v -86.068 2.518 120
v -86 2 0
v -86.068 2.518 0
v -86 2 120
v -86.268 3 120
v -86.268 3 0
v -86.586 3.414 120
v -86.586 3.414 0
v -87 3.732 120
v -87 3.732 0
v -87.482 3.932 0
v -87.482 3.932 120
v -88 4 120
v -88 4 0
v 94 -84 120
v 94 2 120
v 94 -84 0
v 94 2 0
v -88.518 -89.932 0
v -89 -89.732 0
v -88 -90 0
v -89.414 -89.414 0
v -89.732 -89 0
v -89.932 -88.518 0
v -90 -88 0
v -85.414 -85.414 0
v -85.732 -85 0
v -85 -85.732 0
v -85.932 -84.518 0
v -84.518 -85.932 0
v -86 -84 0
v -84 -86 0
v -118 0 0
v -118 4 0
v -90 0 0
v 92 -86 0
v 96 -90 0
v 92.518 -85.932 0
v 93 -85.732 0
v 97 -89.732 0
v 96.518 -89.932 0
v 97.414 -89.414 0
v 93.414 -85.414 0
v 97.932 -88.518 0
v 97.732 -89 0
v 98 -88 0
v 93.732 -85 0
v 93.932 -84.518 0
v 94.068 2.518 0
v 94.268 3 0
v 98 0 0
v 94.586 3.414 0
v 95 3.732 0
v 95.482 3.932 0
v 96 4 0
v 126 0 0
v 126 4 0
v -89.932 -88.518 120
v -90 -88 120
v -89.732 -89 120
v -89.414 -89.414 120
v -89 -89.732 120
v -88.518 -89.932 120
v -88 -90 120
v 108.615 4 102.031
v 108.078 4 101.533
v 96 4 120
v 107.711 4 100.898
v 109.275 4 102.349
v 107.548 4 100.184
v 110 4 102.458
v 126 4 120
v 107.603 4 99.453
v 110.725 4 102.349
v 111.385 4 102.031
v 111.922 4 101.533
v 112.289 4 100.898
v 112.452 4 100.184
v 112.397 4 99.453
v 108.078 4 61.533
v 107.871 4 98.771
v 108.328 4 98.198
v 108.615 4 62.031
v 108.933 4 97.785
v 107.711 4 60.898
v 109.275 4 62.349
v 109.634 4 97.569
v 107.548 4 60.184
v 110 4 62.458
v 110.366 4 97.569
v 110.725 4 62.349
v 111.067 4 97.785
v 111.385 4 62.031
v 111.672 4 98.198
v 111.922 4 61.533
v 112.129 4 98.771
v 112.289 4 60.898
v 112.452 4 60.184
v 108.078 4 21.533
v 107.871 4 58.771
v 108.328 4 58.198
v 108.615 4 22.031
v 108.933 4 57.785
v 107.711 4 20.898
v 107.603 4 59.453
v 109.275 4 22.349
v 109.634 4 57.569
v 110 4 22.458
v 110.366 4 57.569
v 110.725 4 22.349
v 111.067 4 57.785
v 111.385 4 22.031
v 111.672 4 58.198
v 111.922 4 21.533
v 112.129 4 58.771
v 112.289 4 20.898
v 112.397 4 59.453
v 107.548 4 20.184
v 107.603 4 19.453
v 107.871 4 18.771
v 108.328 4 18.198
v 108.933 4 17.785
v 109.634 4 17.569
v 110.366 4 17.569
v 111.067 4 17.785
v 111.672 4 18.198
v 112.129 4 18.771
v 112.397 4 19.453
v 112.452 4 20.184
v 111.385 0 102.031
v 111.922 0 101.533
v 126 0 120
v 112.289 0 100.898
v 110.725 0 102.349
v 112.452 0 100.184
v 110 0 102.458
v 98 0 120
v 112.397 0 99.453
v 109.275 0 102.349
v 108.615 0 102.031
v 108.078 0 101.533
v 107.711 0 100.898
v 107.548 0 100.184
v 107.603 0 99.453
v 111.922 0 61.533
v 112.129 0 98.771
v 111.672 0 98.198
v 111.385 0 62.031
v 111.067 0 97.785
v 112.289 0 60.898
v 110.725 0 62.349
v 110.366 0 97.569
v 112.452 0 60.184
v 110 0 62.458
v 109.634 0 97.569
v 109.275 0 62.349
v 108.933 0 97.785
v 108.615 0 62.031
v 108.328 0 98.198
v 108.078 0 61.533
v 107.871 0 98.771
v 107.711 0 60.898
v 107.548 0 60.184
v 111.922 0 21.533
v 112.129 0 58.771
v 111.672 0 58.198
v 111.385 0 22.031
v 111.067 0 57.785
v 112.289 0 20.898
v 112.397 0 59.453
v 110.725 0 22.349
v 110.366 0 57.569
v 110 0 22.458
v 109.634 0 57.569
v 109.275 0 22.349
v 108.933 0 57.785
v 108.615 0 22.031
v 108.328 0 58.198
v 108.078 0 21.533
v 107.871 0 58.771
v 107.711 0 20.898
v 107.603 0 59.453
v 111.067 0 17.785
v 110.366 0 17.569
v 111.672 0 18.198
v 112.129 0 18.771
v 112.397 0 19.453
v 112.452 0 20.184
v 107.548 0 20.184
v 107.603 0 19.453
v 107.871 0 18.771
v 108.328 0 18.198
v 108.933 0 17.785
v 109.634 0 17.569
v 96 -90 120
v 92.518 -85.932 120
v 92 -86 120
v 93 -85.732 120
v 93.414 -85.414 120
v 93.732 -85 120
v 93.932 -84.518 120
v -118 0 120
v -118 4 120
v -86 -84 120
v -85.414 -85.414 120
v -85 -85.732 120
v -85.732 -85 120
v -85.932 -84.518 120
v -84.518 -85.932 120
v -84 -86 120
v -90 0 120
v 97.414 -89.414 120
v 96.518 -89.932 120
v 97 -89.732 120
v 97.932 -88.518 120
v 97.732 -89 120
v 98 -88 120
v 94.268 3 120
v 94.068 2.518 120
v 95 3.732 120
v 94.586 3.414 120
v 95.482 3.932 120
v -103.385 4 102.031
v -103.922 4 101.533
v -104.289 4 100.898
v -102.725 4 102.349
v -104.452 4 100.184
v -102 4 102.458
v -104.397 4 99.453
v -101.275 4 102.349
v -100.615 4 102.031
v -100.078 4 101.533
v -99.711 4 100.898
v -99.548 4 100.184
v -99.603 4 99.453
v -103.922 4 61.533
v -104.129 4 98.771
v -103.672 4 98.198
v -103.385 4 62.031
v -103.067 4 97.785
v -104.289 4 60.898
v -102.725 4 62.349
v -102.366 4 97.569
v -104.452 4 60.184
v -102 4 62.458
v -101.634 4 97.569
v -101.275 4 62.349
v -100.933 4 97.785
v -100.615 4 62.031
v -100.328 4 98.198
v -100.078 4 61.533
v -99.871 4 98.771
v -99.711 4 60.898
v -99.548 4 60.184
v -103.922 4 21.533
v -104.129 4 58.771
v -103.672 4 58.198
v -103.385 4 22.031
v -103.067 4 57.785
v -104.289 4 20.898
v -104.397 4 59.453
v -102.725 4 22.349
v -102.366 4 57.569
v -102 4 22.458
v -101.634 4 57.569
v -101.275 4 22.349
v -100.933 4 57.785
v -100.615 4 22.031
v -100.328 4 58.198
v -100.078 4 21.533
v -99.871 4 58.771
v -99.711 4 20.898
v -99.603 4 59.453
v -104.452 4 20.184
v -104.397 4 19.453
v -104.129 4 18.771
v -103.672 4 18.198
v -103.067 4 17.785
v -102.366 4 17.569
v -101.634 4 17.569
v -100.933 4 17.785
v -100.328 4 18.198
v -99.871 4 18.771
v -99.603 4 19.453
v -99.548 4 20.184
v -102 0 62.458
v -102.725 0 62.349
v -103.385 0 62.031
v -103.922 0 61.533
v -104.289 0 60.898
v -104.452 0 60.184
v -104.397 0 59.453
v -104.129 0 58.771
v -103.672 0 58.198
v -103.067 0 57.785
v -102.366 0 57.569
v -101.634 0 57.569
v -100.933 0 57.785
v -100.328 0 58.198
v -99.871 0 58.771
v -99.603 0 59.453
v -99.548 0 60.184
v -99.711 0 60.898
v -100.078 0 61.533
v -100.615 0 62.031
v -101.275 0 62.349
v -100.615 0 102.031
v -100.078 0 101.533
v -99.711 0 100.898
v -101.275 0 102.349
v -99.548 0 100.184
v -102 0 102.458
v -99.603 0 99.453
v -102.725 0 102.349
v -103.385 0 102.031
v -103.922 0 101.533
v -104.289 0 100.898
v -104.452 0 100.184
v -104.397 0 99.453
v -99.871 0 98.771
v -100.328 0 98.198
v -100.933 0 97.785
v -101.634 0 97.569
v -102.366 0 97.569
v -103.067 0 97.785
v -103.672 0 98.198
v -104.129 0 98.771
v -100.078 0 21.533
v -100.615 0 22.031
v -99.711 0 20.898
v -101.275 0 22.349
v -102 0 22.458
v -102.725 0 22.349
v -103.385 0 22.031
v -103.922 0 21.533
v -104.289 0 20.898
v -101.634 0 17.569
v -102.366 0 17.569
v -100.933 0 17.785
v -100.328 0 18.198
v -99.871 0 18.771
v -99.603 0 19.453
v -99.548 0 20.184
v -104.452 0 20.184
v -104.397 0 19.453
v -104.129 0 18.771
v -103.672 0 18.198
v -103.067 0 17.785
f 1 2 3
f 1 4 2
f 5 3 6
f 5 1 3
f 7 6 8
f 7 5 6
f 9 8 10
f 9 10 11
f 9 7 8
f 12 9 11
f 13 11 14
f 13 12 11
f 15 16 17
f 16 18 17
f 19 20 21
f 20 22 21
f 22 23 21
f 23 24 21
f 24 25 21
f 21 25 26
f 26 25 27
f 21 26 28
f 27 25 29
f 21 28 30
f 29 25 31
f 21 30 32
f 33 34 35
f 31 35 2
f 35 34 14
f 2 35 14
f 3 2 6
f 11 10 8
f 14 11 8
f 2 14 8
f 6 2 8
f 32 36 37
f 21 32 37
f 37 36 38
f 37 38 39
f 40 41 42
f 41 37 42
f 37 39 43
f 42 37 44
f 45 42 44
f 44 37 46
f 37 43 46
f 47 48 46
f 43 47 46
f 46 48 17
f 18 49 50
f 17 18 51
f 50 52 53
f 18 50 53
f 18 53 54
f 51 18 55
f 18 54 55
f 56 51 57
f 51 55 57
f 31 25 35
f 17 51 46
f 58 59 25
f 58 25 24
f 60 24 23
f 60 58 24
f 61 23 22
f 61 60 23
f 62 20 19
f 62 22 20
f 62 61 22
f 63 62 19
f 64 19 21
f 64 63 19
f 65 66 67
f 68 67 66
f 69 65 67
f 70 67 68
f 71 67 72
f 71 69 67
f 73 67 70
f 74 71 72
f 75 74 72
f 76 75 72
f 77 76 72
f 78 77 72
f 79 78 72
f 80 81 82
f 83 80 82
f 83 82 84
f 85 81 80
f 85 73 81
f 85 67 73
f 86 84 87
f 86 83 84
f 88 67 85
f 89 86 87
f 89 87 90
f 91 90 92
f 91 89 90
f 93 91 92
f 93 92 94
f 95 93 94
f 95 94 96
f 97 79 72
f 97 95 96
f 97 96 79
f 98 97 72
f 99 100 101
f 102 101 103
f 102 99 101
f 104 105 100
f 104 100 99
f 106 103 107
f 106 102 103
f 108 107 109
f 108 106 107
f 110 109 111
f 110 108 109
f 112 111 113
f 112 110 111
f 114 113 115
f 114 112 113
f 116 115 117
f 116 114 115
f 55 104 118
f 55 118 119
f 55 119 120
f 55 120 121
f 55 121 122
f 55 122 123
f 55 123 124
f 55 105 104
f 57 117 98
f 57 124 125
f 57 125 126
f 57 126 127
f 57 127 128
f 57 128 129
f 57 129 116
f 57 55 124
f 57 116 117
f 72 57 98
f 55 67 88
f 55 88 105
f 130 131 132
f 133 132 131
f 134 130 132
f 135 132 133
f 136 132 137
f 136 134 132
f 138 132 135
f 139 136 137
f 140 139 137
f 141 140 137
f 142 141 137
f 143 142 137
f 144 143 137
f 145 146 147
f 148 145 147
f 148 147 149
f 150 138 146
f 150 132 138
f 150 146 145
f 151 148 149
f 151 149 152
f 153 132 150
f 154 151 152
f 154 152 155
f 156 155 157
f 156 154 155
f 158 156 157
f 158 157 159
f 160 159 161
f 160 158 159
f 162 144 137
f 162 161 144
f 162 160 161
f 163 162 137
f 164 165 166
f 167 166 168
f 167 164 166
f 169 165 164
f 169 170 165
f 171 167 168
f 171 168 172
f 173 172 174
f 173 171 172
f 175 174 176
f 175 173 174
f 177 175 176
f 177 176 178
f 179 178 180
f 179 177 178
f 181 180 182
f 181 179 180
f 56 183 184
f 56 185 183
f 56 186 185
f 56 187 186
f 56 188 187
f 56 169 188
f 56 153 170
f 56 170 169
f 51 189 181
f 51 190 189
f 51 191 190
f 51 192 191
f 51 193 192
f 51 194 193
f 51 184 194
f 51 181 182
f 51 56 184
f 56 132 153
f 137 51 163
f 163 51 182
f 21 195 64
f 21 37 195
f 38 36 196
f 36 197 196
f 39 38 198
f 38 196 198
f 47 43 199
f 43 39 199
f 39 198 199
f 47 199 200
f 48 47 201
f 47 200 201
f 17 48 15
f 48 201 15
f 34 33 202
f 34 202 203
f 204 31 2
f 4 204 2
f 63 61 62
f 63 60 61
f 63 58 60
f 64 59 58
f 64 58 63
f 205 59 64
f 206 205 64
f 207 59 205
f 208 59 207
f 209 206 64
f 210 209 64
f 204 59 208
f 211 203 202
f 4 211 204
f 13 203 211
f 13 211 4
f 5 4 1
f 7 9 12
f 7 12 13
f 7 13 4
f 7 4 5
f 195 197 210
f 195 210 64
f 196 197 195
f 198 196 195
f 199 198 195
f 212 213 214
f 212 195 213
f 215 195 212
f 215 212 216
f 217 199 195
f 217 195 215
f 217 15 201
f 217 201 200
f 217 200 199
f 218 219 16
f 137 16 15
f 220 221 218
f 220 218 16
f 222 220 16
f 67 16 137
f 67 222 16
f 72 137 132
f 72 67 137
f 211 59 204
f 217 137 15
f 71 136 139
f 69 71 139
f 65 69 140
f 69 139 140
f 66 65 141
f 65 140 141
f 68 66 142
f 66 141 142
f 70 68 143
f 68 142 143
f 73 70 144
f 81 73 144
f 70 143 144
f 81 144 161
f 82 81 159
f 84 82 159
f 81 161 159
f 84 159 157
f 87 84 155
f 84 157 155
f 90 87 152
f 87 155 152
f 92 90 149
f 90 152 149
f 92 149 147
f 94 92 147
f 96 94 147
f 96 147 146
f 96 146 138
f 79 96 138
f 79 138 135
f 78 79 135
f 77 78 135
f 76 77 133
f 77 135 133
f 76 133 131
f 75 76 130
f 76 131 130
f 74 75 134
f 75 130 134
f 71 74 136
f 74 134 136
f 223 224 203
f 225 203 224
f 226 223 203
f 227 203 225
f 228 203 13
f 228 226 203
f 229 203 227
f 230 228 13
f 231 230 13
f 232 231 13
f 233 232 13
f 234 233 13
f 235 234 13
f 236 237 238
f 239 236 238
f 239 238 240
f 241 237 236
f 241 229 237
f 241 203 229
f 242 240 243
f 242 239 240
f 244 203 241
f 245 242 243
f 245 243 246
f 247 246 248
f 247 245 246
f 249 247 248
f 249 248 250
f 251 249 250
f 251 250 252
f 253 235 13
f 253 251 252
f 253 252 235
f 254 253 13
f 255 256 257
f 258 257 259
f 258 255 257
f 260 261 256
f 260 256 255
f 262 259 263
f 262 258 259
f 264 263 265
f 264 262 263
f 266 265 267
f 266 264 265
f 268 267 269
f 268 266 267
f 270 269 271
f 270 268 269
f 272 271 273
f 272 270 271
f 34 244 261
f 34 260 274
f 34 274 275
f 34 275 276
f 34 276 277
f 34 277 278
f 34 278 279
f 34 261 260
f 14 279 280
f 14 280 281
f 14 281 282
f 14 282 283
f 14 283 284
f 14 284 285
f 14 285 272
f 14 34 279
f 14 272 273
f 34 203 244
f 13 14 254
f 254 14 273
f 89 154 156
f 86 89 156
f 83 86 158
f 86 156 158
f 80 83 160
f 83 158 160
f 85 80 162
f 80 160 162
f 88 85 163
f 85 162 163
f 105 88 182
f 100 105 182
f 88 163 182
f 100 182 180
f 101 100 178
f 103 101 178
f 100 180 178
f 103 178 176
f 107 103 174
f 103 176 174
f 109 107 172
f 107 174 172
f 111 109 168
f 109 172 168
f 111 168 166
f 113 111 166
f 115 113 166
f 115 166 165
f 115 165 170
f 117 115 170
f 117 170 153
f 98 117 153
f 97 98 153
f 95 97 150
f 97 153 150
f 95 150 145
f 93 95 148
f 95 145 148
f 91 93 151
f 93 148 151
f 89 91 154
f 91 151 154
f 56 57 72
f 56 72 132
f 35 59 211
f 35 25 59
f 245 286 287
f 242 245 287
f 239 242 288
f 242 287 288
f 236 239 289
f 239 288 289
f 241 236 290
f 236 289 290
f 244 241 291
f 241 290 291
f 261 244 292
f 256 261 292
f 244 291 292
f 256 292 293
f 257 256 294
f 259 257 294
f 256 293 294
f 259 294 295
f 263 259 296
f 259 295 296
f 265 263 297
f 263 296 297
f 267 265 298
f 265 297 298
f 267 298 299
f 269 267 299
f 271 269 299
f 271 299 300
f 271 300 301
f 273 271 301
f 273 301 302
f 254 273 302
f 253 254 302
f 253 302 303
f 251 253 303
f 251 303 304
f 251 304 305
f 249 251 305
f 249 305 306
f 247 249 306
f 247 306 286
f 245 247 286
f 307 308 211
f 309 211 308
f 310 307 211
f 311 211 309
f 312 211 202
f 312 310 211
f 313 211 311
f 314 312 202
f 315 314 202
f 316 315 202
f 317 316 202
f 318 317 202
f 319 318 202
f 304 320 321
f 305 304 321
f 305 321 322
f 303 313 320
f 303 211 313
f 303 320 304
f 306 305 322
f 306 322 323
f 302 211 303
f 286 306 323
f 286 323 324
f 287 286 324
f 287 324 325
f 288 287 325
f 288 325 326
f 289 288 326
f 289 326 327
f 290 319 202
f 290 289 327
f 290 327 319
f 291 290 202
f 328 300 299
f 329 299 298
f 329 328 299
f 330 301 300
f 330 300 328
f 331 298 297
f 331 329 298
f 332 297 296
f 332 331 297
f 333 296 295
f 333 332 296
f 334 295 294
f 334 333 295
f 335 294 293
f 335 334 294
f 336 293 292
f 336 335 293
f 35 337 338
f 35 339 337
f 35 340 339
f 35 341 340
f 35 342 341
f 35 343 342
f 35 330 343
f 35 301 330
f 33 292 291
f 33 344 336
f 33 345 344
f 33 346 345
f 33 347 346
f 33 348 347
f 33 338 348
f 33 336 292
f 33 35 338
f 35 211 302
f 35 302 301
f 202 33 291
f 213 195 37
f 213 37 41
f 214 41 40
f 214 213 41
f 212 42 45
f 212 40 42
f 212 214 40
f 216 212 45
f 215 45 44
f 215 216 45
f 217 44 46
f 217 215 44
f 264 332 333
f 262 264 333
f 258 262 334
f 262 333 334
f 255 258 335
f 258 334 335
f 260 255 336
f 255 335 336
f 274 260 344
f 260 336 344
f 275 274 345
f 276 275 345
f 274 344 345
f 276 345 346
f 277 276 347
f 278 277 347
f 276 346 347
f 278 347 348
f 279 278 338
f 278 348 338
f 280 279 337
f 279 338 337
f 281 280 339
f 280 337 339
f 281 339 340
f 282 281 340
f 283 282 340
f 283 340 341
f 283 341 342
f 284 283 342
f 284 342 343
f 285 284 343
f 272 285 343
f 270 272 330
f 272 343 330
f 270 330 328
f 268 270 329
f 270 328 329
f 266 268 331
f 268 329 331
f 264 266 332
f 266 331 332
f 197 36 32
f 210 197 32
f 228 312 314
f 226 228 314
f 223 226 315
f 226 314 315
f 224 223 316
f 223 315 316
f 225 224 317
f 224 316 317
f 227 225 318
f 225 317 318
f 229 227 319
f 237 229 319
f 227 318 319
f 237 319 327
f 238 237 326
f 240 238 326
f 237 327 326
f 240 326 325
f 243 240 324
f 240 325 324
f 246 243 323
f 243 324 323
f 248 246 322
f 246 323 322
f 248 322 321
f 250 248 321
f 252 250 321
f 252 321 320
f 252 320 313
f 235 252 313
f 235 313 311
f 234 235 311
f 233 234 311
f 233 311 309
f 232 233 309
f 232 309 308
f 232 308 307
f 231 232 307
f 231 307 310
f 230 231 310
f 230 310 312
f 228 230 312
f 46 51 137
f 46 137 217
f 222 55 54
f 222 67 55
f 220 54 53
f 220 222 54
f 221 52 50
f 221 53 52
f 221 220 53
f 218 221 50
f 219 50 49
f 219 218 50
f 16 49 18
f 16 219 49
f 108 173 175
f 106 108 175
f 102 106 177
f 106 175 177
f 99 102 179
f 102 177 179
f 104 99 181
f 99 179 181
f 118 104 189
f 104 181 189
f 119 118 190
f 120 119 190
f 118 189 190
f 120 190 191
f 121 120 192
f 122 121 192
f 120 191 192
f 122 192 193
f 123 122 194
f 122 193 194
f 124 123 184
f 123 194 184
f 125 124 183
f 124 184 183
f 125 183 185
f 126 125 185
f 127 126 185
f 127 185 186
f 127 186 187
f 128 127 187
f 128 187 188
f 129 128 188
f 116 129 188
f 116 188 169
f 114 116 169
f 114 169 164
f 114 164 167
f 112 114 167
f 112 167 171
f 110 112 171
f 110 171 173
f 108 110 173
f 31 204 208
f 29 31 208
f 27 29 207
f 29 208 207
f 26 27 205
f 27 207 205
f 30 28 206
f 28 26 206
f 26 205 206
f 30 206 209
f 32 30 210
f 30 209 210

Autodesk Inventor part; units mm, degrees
ref_plane "YZ Plane" through (0, 0, 0) normal (1, 0, 0) x (0, 1, 0)
ref_plane "XZ Plane" through (0, 0, 0) normal (0, 1, 0) x (-1, 0, 0)
ref_plane "XY Plane" through (0, 0, 0) normal (0, 0, 1) x (1, 0, 0)
sketch "Sketch1" plane through (0, 0, 0) normal (0, 0, 1) x (1, 0, 0)
  line L0 (98, 0) -> (98, -90)
  line L1 (98, -90) -> (-90, -90)
  line L2 (-90, -90) -> (-90, 0)
  line L3 (126, 4) -> (126, 0)
  line L4 (126, 0) -> (-118, 0)
  line L5 (-118, 0) -> (-118, 4)
  line L6 (-86, 4) -> (94, 4)
  line L7 (94, 4) -> (94, -86)
  line L8 (94, -86) -> (-86, -86)
  line L9 (-86, -86) -> (-86, 4)
  line L10 (-90, 0) -> (-86, 0)
  line L11 (94, 0) -> (98, 0)
  line L12 (-118, 4) -> (-86, 4)
  line L13 (94, 4) -> (126, 4)
  point P0 (0, 0)
  point P1 (6, -4)
  point P2 (126, 2)
  point P3 (98, 0)
  dimension "d0" = 188
  dimension "d1" = 90
  dimension "d3" = 90
  dimension "d4" = 244
  dimension "d5" = 120
  dimension "d8" = 90
  dimension "d9" = 180
  dimension "d10" = 4
  dimension "d13" = 0
  dimension "d14" = 4
  dimension "d91" = 32
extrude "Extrusion1" add sketch "Sketch1" along normal blind 120 contours L4 L7 L13 L3 | L0 L1 L2 L4 L9 L8 L7 | L4 L5 L12 L9
fillet "Fillet1" radius 2 4 edges at (-86, -86, 60) (-86, 4, 60) (94, 4, 60) (98, -90, 60)
fillet "Fillet2" radius 2 2 edges at (-90, -90, 60) (94, -86, 60)
sketch "Sketch7" plane through (-118, 4, 120) normal (0, 1, 0) x (1, 0, 0)
  point P0 (118, 120)
sketch "Sketch8" plane through (126, 4, 120) normal (0, 1, 0) x (1, 0, 0)
  line L0 (0, 120) -> (0, 0) projected
  line L1 (-34, 0) -> (-210, 0) projected
  line L2 (-244, 120) -> (-244, 0) projected
  line L3 (-214, 0) -> (-244, 0) projected
  point P0 (-126, 120)
  point P1 (-16, 100)
  point P2 (-16, 60)
  point P3 (-16, 20)
  point P4 (-228, 100)
  point P5 (-228, 60)
  point P6 (-228, 20)
  dimension "d72" = 16
  dimension "d73" = 16
  dimension "d74" = 16
  dimension "d75" = 20
  dimension "d76" = 40
  dimension "d77" = 40
  dimension "d78" = 16
  dimension "d79" = 40
  dimension "d80" = 40
  dimension "d81" = 20
  dimension "d82" = 16
  dimension "d83" = 16
hole "Hole6" at (110, 4, 20) at (110, 4, 60) at (110, 4, 100) at (-102, 4, 20) at (-102, 4, 60) at (-102, 4, 100) direction (0, -1, 0) diameter 4.917 end through all thread size "M6x1" class "6H" standard "ISO Metric profile"
equation "\"d89\" = Thickness"
equation "\"BendRadius\" = Thickness"
equation "\"BendReliefWidth\" = Thickness"
equation "\"BendReliefDepth\" = 0.5 * Thickness"
equation "\"CornerReliefSize\" = 4 * Thickness"
equation "\"MinimumRemnant\" = 2 * Thickness"
equation "\"TransitionRadius\" = BendRadius"
equation "\"JacobiRadiusSize\" = BendRadius"
equation "\"GapSize\" = Thickness"
equation "\"Thickness\" = 0.5"
properties part number "Top joint housing back"
